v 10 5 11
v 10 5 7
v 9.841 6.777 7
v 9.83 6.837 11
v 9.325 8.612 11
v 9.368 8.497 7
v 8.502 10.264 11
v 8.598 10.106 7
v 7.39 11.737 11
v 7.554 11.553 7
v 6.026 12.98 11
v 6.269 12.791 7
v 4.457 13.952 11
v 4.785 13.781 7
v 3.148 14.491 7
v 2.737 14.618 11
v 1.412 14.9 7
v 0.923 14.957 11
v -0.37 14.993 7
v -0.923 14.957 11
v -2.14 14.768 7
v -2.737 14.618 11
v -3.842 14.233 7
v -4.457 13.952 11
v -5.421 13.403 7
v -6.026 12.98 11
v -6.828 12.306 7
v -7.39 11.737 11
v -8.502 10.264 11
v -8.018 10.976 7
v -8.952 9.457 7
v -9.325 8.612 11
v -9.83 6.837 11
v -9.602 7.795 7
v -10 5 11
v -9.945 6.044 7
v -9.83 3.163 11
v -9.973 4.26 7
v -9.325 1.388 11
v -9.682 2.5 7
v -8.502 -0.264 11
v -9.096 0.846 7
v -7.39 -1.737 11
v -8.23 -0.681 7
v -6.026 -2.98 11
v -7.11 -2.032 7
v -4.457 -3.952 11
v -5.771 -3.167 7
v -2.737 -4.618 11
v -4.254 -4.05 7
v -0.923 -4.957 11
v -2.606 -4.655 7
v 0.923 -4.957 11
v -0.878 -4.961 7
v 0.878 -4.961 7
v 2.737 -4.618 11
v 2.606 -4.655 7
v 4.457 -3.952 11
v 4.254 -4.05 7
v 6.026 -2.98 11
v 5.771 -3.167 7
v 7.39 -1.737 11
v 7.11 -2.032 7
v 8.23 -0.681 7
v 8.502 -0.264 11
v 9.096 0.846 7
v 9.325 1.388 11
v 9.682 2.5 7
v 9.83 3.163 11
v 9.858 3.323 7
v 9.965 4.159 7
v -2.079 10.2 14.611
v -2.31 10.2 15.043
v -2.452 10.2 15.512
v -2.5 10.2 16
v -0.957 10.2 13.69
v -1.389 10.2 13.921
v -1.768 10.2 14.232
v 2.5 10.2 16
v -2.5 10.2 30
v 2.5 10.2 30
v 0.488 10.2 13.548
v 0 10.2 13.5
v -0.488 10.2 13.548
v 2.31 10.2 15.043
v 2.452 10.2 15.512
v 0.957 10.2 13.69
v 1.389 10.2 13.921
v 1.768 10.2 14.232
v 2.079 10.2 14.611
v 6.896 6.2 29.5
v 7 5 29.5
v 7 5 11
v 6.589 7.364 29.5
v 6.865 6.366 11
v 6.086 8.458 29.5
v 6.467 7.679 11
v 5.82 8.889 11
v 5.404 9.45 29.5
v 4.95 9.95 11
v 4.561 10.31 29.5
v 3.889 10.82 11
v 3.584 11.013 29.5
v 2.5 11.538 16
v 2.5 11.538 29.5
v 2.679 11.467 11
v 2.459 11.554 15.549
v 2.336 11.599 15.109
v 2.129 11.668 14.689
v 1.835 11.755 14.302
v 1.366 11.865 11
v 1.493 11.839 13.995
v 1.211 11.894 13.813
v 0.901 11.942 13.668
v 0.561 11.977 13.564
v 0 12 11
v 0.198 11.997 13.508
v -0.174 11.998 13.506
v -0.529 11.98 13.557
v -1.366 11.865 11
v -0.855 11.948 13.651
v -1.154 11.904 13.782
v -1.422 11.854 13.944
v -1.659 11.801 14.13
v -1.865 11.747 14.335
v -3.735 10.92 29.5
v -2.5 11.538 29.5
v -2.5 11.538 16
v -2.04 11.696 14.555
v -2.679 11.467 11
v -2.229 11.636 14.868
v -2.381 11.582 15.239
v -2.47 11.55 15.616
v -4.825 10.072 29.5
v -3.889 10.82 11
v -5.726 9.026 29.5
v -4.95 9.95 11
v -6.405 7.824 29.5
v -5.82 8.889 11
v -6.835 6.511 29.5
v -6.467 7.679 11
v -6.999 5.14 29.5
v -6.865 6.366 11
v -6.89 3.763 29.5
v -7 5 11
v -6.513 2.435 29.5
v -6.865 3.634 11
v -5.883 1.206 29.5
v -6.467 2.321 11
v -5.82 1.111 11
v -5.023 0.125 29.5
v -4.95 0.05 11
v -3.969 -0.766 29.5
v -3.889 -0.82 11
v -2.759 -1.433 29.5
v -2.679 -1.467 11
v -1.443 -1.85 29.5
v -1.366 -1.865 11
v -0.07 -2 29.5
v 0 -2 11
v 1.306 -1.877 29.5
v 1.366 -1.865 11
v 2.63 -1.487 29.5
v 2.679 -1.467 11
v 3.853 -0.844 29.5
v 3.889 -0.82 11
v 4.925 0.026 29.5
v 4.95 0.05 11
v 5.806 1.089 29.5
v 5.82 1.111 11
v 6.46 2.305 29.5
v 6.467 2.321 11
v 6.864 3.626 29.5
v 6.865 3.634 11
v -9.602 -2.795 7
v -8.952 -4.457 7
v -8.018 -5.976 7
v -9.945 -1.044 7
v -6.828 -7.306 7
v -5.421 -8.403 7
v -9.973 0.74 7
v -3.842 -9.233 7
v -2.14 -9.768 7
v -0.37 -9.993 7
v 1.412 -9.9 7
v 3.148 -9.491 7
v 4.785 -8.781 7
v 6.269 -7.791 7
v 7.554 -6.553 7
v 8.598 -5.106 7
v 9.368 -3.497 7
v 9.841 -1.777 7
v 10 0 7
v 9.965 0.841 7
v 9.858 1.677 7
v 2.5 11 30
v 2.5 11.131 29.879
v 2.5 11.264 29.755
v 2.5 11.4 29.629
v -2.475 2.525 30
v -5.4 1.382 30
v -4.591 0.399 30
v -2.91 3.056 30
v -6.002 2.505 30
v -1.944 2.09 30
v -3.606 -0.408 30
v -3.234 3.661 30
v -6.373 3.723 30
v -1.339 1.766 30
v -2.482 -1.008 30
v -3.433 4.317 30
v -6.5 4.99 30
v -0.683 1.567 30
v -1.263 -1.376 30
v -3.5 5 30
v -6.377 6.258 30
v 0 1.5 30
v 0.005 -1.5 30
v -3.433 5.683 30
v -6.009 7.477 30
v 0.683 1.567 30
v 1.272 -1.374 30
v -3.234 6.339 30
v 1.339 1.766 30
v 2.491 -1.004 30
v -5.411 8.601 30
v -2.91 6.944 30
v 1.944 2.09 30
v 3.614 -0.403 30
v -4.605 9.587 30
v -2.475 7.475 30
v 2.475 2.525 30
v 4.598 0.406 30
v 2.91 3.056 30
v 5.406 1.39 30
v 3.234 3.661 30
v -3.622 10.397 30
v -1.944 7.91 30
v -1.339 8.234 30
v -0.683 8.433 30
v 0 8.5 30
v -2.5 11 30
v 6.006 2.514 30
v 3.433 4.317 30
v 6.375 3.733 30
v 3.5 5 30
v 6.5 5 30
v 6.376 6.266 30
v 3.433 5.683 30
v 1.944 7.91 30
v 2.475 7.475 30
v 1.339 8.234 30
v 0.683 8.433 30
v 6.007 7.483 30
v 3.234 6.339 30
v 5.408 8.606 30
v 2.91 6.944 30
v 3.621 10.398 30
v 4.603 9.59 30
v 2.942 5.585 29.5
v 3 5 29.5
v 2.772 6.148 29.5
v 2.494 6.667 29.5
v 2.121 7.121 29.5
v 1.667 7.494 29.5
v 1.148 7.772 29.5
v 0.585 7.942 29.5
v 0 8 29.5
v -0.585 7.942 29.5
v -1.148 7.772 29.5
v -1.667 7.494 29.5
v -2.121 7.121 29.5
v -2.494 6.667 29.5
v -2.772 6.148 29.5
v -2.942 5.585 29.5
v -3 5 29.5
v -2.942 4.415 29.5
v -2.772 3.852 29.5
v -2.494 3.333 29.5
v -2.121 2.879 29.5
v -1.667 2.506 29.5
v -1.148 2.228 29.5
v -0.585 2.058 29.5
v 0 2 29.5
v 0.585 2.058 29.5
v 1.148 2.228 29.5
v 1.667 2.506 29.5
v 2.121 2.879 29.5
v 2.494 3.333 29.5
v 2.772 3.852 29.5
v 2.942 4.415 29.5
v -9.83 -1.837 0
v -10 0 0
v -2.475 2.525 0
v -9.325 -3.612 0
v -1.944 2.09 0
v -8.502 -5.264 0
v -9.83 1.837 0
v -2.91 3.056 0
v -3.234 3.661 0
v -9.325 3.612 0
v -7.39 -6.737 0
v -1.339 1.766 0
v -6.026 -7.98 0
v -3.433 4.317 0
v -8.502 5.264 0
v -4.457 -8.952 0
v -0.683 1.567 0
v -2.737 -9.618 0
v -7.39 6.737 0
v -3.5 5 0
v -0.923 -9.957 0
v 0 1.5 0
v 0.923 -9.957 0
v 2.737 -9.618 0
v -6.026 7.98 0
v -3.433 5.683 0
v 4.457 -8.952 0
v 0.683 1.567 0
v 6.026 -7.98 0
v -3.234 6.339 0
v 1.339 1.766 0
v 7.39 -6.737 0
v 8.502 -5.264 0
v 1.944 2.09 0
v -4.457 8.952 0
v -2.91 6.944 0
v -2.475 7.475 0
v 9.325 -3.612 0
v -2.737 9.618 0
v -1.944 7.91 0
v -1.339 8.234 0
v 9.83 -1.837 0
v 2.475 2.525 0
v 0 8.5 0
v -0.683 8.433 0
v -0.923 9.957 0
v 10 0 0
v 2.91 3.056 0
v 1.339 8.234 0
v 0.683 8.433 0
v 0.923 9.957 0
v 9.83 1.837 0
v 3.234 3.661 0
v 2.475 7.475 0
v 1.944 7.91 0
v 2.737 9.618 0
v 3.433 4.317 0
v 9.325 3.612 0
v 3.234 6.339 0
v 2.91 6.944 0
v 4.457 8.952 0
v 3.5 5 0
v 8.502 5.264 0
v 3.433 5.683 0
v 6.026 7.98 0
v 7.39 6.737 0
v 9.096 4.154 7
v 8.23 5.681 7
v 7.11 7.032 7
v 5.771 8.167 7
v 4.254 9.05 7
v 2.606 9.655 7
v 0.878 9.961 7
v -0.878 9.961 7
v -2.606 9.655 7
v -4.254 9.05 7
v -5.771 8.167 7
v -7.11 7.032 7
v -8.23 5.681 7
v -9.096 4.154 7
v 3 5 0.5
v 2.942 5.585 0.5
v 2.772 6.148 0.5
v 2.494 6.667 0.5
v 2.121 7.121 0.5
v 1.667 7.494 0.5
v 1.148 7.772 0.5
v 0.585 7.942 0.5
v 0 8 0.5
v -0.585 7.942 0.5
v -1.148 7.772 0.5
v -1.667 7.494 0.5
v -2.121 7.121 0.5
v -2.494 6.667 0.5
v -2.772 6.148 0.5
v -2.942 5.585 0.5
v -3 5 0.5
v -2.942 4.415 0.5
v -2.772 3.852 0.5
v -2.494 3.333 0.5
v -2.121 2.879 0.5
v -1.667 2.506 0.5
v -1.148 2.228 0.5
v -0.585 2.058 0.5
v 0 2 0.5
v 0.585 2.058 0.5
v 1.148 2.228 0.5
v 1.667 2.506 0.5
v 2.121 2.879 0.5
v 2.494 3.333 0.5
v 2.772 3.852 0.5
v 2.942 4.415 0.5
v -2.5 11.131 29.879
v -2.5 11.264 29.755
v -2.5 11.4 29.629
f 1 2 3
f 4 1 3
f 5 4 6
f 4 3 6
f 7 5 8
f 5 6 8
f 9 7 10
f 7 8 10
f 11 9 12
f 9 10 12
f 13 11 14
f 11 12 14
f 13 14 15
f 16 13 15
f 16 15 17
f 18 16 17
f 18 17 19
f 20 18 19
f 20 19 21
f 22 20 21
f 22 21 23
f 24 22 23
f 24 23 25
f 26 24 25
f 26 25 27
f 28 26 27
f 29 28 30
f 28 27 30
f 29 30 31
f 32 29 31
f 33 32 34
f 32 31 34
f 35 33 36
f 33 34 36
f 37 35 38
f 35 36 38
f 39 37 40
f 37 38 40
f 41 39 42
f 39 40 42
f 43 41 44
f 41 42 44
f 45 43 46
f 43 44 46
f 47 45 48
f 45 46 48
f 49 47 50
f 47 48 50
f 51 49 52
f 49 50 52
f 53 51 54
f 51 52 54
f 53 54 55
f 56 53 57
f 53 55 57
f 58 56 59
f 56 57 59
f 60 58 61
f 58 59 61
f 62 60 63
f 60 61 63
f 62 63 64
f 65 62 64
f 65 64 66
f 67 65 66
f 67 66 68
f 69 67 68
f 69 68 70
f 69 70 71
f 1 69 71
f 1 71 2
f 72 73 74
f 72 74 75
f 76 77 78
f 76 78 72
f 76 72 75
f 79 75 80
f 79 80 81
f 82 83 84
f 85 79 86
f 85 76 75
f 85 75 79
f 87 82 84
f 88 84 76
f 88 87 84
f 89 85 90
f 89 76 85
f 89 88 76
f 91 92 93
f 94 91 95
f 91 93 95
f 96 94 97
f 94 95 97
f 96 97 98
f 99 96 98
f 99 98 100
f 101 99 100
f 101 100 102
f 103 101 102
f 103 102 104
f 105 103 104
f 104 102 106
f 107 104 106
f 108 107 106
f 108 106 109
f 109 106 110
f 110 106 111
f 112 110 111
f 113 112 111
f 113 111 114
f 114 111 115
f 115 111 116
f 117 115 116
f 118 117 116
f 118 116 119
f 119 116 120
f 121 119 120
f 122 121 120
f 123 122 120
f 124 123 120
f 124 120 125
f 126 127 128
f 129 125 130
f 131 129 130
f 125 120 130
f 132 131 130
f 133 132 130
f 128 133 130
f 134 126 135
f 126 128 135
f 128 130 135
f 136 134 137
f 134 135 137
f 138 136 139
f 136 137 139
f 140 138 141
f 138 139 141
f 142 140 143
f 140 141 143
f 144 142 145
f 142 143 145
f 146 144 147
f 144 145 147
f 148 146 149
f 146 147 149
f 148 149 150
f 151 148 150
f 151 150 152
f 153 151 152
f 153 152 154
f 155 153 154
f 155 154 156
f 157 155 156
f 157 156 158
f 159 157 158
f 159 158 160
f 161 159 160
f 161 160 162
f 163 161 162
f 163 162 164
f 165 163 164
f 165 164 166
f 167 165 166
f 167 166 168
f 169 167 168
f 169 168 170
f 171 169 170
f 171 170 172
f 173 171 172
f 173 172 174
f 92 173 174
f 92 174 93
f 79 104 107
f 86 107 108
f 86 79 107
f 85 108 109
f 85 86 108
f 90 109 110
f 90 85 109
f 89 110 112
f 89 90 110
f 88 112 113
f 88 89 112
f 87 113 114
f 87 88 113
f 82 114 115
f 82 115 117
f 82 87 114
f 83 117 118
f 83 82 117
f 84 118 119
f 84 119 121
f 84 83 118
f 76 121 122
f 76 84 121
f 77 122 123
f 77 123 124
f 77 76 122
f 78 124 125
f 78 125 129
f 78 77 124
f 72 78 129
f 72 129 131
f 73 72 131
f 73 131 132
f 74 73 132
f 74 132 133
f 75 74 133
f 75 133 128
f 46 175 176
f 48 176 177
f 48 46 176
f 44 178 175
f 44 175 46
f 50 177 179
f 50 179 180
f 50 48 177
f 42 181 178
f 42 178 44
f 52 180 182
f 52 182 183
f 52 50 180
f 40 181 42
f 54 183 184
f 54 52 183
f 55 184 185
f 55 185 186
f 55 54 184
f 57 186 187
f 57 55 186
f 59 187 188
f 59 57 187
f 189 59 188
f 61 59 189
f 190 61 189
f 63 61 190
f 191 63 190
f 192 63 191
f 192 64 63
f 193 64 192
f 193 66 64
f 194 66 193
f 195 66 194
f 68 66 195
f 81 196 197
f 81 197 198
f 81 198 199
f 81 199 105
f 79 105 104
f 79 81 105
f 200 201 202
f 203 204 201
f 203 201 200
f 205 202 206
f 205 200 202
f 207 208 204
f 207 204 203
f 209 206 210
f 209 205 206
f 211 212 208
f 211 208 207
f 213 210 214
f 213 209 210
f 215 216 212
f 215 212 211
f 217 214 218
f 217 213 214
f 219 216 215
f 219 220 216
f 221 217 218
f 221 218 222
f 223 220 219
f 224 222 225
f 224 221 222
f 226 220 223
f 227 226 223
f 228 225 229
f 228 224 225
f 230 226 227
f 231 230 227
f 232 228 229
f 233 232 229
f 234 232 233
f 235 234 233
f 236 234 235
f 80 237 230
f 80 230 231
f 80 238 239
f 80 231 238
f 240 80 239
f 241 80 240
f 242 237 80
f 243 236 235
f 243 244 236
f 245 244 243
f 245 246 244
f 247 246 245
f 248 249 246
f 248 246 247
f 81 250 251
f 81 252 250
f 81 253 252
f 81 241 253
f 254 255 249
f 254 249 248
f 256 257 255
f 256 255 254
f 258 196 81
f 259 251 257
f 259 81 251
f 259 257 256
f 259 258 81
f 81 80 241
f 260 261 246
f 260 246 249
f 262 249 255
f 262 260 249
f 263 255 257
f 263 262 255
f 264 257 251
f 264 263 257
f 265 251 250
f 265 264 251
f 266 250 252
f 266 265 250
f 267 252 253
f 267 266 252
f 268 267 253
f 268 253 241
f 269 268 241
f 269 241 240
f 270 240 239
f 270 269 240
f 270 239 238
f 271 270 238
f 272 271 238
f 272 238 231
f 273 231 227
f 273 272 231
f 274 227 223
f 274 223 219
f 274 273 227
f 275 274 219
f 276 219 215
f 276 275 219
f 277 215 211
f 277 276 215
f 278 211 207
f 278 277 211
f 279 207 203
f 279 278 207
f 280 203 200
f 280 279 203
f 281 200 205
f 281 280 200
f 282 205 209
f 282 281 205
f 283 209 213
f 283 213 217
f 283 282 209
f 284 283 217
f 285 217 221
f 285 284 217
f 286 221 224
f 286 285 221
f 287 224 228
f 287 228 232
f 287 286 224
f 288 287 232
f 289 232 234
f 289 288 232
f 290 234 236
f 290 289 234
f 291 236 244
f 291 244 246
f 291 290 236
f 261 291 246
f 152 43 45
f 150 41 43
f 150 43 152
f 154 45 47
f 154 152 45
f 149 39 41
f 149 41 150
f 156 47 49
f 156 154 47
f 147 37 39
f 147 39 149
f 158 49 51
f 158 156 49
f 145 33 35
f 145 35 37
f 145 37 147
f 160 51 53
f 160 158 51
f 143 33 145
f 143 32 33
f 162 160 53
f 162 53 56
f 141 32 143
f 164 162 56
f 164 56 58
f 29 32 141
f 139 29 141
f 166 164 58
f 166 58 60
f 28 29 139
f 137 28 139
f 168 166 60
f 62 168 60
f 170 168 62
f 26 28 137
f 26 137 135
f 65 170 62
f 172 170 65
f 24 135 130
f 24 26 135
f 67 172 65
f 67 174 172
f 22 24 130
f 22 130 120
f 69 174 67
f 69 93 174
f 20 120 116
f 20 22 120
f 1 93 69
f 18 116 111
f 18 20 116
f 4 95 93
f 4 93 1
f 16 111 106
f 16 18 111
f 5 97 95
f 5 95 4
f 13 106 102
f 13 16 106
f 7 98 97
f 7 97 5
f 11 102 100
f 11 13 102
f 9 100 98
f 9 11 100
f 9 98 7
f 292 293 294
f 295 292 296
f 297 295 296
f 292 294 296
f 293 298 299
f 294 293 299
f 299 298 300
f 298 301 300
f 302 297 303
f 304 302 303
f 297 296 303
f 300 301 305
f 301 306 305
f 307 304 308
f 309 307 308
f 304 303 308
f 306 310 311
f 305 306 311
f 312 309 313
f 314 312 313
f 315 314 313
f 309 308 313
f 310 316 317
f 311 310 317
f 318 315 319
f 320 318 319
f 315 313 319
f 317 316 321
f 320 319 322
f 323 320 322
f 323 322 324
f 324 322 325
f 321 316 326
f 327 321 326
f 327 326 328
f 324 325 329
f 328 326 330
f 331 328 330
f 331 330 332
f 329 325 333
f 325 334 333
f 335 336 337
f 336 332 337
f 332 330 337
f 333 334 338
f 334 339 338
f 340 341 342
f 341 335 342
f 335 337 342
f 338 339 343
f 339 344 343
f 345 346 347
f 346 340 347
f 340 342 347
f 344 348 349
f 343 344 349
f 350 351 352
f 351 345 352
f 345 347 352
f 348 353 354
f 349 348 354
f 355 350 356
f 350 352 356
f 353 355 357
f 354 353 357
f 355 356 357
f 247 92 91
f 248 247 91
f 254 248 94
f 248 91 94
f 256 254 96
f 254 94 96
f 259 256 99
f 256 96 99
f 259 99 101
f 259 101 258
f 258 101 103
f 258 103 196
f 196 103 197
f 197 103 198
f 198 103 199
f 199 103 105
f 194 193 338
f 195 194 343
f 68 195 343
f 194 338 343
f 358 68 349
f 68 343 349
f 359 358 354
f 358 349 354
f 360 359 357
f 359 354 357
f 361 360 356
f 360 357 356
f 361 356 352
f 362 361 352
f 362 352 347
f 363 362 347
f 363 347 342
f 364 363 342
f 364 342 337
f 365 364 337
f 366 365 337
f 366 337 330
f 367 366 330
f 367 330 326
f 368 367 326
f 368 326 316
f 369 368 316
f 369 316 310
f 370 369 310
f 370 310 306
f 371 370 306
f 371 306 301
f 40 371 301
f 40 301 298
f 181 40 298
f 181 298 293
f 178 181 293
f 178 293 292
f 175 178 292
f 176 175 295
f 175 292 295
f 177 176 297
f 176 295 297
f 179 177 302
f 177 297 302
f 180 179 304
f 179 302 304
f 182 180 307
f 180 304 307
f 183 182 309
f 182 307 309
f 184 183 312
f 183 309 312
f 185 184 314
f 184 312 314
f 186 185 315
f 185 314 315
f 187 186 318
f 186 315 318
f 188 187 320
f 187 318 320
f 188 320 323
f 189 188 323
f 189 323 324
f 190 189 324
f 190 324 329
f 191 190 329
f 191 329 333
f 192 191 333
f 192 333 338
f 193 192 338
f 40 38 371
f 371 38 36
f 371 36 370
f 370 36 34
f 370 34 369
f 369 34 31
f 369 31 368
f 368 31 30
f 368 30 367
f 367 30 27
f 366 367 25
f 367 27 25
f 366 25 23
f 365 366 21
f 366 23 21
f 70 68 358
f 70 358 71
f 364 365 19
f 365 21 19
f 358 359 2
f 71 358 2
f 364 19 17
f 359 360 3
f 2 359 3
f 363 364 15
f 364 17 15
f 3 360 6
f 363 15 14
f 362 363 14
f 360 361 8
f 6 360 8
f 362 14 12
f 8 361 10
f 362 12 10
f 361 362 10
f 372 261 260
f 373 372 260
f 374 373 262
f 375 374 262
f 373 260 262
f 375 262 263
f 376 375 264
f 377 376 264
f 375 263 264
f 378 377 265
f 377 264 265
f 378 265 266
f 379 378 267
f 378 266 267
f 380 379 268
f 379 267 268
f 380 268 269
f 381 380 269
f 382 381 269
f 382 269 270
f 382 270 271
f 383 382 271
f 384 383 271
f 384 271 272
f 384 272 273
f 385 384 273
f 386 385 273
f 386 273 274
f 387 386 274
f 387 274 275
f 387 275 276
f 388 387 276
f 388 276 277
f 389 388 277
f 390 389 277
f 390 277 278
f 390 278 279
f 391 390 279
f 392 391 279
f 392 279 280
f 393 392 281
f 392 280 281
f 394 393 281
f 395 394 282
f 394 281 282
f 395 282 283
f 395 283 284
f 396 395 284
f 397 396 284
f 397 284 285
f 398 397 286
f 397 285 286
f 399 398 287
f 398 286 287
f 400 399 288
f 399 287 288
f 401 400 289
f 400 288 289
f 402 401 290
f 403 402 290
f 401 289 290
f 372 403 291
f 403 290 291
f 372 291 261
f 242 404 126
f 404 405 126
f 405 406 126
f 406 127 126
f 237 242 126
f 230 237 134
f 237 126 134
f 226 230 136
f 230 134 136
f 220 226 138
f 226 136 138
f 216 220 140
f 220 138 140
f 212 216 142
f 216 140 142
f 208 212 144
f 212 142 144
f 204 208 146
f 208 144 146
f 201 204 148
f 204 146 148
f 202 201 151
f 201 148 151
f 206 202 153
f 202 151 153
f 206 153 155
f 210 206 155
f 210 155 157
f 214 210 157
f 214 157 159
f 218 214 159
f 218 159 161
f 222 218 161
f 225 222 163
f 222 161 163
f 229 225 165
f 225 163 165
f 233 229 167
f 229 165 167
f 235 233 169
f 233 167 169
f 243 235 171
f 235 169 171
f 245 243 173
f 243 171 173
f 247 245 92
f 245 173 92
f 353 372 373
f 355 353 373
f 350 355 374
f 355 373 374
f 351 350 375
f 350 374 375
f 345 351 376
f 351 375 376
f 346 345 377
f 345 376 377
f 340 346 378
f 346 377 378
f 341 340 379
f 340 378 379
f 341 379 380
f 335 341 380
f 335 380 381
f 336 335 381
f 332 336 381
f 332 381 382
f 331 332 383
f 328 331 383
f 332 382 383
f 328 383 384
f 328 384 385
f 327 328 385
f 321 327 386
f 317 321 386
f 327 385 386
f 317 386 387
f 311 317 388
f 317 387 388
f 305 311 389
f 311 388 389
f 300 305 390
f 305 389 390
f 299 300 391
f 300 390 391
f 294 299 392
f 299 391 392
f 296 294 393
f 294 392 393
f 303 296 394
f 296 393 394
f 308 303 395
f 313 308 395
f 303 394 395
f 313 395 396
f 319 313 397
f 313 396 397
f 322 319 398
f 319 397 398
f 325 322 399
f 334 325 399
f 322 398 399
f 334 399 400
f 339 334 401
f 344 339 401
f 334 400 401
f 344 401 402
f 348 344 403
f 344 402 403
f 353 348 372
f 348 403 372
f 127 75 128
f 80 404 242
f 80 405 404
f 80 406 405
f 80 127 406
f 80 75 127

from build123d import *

# Parameters (mm, degrees)
SKETCH2_R           = 10
BOSS_EXTRUDE1_DEPTH = 7
SKETCH3_R           = 10
BOSS_EXTRUDE2_DEPTH = 4
SKETCH4_R           = 7
BOSS_EXTRUDE3_DEPTH = 19
SKETCH5_R           = 3
CUT_EXTRUDE1_DEPTH  = 31
CHAMFER1_SIZE       = 0.5
CUT_EXTRUDE3_START  = 10.2
CUT_EXTRUDE3_DEPTH  = 5.8
CHAMFER2_SIZE       = 0.5


with BuildPart() as part:
    # Sketch2 → Boss-Extrude1 (new body)
    with BuildSketch(Plane.XY):
        Circle(SKETCH2_R)
    extrude(amount=BOSS_EXTRUDE1_DEPTH)

    # Sketch3 → Boss-Extrude2 (add)
    with BuildSketch(Plane.XY.offset(7)):
        with Locations((0, 5)):
            Circle(SKETCH3_R)
    extrude(amount=BOSS_EXTRUDE2_DEPTH)

    # Sketch4 → Boss-Extrude3 (add)
    with BuildSketch(Plane.XY.offset(11)):
        with Locations((0, 5)):
            Circle(SKETCH4_R)
    extrude(amount=BOSS_EXTRUDE3_DEPTH)

    # Sketch5 → Cut-Extrude1 (cut, through all)
    with BuildSketch(Plane.XY.offset(30)):
        with Locations((0, 5)):
            Circle(SKETCH5_R)
    extrude(amount=-CUT_EXTRUDE1_DEPTH, mode=Mode.SUBTRACT)

    # Chamfer1
    chamfer1_edges = [part.edges().sort_by_distance(p)[0] for p in [
        (-3, 5, 0),
        (-3, 5, 30),
    ]]
    chamfer(chamfer1_edges, length=CHAMFER1_SIZE)

    # Sketch6 → Cut-Extrude3 (cut, through all)
    with BuildSketch(Plane(origin=(0, 0, 0), x_dir=(1, 0, 0), z_dir=(0, 1, 0)).offset(CUT_EXTRUDE3_START)):
        with BuildLine():
            Line((-2.5, -16), (-2.5, -31.730265833))
            Line((-2.5, -31.730265833), (2.5, -31.730265833))
            Line((2.5, -31.730265833), (2.5, -16))
            ThreePointArc((2.5, -16), (0, -13.5), (-2.5, -16))
        make_face()
    extrude(amount=CUT_EXTRUDE3_DEPTH, mode=Mode.SUBTRACT)

    # Chamfer2
    chamfer2_edges = [part.edges().sort_by_distance(p)[0] for p in [
        (-3.968626967, -0.766281297, 30),
    ]]
    chamfer(chamfer2_edges, length=CHAMFER2_SIZE)


solid = part.part
